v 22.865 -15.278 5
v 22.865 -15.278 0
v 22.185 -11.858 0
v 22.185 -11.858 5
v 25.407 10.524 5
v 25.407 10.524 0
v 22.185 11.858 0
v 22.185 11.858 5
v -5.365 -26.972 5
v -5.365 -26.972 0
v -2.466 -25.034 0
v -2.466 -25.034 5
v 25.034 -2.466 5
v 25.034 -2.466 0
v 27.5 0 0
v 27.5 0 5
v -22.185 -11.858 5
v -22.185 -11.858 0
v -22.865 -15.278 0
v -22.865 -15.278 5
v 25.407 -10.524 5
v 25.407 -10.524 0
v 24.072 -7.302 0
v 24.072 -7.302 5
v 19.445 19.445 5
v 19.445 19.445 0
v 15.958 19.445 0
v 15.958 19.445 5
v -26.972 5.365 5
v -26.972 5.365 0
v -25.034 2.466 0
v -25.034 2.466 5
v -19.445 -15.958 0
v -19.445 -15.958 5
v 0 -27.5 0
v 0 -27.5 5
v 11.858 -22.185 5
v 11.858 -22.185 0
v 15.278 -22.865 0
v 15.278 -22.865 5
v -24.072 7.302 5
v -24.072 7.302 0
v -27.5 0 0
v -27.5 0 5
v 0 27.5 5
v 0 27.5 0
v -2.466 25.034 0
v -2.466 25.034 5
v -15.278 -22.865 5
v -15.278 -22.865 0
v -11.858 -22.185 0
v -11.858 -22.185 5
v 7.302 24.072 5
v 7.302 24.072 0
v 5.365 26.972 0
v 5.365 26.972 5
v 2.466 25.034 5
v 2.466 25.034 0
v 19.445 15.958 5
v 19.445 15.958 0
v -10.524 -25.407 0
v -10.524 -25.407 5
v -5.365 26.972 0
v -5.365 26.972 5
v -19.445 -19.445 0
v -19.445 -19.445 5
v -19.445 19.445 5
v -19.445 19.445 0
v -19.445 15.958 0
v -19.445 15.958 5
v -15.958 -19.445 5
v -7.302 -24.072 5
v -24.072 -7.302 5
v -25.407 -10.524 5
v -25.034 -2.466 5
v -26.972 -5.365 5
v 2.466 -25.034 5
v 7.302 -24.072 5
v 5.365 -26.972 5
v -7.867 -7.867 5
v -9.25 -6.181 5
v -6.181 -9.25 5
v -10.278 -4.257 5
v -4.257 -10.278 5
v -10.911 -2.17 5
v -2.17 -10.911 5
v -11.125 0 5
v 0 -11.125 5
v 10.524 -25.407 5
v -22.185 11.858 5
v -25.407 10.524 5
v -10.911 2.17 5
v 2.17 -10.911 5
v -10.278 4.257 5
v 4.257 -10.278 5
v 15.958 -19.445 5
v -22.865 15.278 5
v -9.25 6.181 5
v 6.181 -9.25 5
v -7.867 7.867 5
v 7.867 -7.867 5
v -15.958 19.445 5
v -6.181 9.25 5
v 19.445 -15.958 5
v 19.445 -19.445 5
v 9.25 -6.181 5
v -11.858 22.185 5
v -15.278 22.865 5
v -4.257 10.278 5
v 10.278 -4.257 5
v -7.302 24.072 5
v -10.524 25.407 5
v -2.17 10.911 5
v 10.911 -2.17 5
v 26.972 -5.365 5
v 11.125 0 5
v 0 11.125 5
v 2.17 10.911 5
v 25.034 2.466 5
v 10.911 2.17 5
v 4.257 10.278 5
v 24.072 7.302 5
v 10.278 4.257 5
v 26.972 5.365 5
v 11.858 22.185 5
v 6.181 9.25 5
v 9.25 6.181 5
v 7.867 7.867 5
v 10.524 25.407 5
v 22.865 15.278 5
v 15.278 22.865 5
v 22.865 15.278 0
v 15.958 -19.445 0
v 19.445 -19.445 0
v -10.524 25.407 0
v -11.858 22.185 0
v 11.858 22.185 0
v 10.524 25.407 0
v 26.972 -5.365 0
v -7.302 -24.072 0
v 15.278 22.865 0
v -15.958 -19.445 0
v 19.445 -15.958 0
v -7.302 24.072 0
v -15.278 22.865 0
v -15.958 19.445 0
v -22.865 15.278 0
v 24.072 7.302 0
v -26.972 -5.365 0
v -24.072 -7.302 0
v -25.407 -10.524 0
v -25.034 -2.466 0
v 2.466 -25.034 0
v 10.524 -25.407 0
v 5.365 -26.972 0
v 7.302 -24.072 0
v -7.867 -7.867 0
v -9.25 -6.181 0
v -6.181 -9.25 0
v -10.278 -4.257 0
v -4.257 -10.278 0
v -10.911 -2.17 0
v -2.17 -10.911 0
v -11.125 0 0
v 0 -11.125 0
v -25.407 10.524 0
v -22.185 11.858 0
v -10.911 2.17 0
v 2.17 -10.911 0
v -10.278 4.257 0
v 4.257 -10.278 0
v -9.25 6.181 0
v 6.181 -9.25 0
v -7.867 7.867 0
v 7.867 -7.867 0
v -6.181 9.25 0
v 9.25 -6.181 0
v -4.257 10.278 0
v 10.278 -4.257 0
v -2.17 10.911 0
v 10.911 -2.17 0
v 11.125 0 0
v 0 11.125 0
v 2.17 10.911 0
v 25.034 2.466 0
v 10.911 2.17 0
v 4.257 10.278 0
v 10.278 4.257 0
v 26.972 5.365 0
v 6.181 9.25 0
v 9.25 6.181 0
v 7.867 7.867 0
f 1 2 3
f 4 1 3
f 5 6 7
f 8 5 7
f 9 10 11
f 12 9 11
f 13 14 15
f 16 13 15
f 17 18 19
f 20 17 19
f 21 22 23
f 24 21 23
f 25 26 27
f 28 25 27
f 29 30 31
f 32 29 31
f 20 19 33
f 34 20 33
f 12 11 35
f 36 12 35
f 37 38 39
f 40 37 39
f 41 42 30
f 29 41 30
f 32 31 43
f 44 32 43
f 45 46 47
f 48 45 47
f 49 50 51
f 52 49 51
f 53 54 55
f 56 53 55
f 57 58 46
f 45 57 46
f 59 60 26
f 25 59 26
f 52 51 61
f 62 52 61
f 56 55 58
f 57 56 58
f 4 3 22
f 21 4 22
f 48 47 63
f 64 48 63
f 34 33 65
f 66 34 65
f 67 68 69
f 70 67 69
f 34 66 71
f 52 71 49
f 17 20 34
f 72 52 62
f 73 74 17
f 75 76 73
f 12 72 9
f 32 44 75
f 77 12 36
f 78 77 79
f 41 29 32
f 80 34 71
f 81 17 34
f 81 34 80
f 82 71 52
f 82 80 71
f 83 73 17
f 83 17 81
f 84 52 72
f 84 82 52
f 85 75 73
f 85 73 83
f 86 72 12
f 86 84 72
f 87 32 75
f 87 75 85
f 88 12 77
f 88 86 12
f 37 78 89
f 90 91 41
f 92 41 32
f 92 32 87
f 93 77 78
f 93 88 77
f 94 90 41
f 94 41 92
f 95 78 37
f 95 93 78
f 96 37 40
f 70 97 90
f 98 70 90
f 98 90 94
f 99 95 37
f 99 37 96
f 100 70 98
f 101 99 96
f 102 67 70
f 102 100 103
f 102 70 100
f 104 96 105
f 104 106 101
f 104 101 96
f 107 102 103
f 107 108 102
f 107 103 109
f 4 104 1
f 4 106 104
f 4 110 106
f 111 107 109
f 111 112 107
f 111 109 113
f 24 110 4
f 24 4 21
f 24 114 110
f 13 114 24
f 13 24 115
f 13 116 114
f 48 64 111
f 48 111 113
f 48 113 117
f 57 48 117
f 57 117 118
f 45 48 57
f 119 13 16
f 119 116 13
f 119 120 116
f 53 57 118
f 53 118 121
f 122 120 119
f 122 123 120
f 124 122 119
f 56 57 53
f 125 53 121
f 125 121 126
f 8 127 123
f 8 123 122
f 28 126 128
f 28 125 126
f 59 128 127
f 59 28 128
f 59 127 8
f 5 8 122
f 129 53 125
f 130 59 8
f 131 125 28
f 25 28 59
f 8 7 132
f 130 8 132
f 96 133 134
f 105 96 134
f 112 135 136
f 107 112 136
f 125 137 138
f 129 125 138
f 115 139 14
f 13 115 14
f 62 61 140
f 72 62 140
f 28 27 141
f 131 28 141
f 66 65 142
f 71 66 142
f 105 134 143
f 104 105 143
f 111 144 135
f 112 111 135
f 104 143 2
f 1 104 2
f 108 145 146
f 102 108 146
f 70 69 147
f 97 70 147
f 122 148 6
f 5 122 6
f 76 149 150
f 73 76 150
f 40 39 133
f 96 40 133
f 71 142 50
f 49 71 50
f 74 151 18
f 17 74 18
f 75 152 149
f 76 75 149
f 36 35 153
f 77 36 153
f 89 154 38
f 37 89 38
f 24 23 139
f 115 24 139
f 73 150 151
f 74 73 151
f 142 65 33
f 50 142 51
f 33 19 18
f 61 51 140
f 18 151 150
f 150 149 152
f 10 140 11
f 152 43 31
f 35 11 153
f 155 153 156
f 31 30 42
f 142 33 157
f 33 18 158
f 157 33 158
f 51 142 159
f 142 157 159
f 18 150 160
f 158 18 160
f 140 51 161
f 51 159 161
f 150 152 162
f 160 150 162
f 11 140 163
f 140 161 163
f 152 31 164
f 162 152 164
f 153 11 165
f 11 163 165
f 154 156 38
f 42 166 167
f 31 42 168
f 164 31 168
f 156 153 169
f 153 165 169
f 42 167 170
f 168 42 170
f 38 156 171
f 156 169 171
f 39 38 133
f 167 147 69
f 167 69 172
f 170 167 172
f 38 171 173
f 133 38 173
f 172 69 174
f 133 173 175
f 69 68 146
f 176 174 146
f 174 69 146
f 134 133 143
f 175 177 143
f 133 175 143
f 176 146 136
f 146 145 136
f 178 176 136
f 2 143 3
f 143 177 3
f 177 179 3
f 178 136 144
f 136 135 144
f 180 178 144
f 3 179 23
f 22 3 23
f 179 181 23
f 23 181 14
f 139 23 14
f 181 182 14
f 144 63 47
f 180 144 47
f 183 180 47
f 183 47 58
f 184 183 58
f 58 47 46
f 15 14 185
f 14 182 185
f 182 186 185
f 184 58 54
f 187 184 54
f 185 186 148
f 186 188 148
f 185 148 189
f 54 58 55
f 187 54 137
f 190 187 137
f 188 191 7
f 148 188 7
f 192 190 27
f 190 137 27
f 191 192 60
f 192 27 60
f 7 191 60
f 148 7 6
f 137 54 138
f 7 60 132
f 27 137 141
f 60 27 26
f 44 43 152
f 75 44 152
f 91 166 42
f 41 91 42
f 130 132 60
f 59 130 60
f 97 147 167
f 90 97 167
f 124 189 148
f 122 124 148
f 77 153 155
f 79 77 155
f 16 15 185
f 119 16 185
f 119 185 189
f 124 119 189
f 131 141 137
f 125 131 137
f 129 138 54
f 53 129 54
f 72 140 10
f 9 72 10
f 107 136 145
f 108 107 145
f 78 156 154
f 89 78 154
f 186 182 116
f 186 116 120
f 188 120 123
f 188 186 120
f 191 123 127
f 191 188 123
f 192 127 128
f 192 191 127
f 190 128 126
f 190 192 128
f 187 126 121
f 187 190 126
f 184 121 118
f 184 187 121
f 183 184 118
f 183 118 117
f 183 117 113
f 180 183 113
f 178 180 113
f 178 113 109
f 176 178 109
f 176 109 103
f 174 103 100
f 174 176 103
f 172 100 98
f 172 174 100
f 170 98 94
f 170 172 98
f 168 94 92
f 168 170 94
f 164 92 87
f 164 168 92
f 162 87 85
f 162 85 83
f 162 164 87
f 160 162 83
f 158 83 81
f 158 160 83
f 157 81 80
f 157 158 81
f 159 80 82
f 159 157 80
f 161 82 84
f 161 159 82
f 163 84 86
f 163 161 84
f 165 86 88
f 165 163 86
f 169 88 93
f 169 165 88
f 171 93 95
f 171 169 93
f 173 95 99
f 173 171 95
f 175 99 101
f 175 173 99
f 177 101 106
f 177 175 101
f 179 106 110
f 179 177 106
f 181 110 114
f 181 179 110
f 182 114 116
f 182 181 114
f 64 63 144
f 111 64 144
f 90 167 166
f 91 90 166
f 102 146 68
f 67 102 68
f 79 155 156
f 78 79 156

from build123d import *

# Parameters (mm, degrees)
F0_R     = 11.125
F1_DEPTH = 5


with BuildPart() as f1:
    # F0 (on Top) → F1 (new body)
    with BuildSketch(Plane.XY):
        Polygon((25.034333, -2.465667), (27.5, 0), (25.034333, 2.465667), (26.971595, 5.364984), (24.072278, 7.302246), (25.406687, 10.523794), (22.185138, 11.858204), (22.865414, 15.278181), (19.445436, 15.958457), (19.445436, 19.445436), (15.958457, 19.445436), (15.278181, 22.865414), (11.858204, 22.185138), (10.523794, 25.406687), (7.302246, 24.072278), (5.364984, 26.971595), (2.465667, 25.034333), (0, 27.5), (-2.465667, 25.034333), (-5.364984, 26.971595), (-7.302246, 24.072278), (-10.523794, 25.406687), (-11.858204, 22.185138), (-15.278181, 22.865414), (-15.958457, 19.445436), (-19.445436, 19.445436), (-19.445436, 15.958457), (-22.865414, 15.278181), (-22.185138, 11.858204), (-25.406687, 10.523794), (-24.072278, 7.302246), (-26.971595, 5.364984), (-25.034333, 2.465667), (-27.5, 0), (-25.034333, -2.465667), (-26.971595, -5.364984), (-24.072278, -7.302246), (-25.406687, -10.523794), (-22.185138, -11.858204), (-22.865414, -15.278181), (-19.445436, -15.958457), (-19.445436, -19.445436), (-15.958457, -19.445436), (-15.278181, -22.865414), (-11.858204, -22.185138), (-10.523794, -25.406687), (-7.302246, -24.072278), (-5.364984, -26.971595), (-2.465667, -25.034333), (0, -27.5), (2.465667, -25.034333), (5.364984, -26.971595), (7.302246, -24.072278), (10.523794, -25.406687), (11.858204, -22.185138), (15.278181, -22.865414), (15.958457, -19.445436), (19.445436, -19.445436), (19.445436, -15.958457), (22.865414, -15.278181), (22.185138, -11.858204), (25.406687, -10.523794), (24.072278, -7.302246), (26.971595, -5.364984), align=None)
        Circle(F0_R, mode=Mode.SUBTRACT)
    extrude(amount=F1_DEPTH)


solid = f1.part
